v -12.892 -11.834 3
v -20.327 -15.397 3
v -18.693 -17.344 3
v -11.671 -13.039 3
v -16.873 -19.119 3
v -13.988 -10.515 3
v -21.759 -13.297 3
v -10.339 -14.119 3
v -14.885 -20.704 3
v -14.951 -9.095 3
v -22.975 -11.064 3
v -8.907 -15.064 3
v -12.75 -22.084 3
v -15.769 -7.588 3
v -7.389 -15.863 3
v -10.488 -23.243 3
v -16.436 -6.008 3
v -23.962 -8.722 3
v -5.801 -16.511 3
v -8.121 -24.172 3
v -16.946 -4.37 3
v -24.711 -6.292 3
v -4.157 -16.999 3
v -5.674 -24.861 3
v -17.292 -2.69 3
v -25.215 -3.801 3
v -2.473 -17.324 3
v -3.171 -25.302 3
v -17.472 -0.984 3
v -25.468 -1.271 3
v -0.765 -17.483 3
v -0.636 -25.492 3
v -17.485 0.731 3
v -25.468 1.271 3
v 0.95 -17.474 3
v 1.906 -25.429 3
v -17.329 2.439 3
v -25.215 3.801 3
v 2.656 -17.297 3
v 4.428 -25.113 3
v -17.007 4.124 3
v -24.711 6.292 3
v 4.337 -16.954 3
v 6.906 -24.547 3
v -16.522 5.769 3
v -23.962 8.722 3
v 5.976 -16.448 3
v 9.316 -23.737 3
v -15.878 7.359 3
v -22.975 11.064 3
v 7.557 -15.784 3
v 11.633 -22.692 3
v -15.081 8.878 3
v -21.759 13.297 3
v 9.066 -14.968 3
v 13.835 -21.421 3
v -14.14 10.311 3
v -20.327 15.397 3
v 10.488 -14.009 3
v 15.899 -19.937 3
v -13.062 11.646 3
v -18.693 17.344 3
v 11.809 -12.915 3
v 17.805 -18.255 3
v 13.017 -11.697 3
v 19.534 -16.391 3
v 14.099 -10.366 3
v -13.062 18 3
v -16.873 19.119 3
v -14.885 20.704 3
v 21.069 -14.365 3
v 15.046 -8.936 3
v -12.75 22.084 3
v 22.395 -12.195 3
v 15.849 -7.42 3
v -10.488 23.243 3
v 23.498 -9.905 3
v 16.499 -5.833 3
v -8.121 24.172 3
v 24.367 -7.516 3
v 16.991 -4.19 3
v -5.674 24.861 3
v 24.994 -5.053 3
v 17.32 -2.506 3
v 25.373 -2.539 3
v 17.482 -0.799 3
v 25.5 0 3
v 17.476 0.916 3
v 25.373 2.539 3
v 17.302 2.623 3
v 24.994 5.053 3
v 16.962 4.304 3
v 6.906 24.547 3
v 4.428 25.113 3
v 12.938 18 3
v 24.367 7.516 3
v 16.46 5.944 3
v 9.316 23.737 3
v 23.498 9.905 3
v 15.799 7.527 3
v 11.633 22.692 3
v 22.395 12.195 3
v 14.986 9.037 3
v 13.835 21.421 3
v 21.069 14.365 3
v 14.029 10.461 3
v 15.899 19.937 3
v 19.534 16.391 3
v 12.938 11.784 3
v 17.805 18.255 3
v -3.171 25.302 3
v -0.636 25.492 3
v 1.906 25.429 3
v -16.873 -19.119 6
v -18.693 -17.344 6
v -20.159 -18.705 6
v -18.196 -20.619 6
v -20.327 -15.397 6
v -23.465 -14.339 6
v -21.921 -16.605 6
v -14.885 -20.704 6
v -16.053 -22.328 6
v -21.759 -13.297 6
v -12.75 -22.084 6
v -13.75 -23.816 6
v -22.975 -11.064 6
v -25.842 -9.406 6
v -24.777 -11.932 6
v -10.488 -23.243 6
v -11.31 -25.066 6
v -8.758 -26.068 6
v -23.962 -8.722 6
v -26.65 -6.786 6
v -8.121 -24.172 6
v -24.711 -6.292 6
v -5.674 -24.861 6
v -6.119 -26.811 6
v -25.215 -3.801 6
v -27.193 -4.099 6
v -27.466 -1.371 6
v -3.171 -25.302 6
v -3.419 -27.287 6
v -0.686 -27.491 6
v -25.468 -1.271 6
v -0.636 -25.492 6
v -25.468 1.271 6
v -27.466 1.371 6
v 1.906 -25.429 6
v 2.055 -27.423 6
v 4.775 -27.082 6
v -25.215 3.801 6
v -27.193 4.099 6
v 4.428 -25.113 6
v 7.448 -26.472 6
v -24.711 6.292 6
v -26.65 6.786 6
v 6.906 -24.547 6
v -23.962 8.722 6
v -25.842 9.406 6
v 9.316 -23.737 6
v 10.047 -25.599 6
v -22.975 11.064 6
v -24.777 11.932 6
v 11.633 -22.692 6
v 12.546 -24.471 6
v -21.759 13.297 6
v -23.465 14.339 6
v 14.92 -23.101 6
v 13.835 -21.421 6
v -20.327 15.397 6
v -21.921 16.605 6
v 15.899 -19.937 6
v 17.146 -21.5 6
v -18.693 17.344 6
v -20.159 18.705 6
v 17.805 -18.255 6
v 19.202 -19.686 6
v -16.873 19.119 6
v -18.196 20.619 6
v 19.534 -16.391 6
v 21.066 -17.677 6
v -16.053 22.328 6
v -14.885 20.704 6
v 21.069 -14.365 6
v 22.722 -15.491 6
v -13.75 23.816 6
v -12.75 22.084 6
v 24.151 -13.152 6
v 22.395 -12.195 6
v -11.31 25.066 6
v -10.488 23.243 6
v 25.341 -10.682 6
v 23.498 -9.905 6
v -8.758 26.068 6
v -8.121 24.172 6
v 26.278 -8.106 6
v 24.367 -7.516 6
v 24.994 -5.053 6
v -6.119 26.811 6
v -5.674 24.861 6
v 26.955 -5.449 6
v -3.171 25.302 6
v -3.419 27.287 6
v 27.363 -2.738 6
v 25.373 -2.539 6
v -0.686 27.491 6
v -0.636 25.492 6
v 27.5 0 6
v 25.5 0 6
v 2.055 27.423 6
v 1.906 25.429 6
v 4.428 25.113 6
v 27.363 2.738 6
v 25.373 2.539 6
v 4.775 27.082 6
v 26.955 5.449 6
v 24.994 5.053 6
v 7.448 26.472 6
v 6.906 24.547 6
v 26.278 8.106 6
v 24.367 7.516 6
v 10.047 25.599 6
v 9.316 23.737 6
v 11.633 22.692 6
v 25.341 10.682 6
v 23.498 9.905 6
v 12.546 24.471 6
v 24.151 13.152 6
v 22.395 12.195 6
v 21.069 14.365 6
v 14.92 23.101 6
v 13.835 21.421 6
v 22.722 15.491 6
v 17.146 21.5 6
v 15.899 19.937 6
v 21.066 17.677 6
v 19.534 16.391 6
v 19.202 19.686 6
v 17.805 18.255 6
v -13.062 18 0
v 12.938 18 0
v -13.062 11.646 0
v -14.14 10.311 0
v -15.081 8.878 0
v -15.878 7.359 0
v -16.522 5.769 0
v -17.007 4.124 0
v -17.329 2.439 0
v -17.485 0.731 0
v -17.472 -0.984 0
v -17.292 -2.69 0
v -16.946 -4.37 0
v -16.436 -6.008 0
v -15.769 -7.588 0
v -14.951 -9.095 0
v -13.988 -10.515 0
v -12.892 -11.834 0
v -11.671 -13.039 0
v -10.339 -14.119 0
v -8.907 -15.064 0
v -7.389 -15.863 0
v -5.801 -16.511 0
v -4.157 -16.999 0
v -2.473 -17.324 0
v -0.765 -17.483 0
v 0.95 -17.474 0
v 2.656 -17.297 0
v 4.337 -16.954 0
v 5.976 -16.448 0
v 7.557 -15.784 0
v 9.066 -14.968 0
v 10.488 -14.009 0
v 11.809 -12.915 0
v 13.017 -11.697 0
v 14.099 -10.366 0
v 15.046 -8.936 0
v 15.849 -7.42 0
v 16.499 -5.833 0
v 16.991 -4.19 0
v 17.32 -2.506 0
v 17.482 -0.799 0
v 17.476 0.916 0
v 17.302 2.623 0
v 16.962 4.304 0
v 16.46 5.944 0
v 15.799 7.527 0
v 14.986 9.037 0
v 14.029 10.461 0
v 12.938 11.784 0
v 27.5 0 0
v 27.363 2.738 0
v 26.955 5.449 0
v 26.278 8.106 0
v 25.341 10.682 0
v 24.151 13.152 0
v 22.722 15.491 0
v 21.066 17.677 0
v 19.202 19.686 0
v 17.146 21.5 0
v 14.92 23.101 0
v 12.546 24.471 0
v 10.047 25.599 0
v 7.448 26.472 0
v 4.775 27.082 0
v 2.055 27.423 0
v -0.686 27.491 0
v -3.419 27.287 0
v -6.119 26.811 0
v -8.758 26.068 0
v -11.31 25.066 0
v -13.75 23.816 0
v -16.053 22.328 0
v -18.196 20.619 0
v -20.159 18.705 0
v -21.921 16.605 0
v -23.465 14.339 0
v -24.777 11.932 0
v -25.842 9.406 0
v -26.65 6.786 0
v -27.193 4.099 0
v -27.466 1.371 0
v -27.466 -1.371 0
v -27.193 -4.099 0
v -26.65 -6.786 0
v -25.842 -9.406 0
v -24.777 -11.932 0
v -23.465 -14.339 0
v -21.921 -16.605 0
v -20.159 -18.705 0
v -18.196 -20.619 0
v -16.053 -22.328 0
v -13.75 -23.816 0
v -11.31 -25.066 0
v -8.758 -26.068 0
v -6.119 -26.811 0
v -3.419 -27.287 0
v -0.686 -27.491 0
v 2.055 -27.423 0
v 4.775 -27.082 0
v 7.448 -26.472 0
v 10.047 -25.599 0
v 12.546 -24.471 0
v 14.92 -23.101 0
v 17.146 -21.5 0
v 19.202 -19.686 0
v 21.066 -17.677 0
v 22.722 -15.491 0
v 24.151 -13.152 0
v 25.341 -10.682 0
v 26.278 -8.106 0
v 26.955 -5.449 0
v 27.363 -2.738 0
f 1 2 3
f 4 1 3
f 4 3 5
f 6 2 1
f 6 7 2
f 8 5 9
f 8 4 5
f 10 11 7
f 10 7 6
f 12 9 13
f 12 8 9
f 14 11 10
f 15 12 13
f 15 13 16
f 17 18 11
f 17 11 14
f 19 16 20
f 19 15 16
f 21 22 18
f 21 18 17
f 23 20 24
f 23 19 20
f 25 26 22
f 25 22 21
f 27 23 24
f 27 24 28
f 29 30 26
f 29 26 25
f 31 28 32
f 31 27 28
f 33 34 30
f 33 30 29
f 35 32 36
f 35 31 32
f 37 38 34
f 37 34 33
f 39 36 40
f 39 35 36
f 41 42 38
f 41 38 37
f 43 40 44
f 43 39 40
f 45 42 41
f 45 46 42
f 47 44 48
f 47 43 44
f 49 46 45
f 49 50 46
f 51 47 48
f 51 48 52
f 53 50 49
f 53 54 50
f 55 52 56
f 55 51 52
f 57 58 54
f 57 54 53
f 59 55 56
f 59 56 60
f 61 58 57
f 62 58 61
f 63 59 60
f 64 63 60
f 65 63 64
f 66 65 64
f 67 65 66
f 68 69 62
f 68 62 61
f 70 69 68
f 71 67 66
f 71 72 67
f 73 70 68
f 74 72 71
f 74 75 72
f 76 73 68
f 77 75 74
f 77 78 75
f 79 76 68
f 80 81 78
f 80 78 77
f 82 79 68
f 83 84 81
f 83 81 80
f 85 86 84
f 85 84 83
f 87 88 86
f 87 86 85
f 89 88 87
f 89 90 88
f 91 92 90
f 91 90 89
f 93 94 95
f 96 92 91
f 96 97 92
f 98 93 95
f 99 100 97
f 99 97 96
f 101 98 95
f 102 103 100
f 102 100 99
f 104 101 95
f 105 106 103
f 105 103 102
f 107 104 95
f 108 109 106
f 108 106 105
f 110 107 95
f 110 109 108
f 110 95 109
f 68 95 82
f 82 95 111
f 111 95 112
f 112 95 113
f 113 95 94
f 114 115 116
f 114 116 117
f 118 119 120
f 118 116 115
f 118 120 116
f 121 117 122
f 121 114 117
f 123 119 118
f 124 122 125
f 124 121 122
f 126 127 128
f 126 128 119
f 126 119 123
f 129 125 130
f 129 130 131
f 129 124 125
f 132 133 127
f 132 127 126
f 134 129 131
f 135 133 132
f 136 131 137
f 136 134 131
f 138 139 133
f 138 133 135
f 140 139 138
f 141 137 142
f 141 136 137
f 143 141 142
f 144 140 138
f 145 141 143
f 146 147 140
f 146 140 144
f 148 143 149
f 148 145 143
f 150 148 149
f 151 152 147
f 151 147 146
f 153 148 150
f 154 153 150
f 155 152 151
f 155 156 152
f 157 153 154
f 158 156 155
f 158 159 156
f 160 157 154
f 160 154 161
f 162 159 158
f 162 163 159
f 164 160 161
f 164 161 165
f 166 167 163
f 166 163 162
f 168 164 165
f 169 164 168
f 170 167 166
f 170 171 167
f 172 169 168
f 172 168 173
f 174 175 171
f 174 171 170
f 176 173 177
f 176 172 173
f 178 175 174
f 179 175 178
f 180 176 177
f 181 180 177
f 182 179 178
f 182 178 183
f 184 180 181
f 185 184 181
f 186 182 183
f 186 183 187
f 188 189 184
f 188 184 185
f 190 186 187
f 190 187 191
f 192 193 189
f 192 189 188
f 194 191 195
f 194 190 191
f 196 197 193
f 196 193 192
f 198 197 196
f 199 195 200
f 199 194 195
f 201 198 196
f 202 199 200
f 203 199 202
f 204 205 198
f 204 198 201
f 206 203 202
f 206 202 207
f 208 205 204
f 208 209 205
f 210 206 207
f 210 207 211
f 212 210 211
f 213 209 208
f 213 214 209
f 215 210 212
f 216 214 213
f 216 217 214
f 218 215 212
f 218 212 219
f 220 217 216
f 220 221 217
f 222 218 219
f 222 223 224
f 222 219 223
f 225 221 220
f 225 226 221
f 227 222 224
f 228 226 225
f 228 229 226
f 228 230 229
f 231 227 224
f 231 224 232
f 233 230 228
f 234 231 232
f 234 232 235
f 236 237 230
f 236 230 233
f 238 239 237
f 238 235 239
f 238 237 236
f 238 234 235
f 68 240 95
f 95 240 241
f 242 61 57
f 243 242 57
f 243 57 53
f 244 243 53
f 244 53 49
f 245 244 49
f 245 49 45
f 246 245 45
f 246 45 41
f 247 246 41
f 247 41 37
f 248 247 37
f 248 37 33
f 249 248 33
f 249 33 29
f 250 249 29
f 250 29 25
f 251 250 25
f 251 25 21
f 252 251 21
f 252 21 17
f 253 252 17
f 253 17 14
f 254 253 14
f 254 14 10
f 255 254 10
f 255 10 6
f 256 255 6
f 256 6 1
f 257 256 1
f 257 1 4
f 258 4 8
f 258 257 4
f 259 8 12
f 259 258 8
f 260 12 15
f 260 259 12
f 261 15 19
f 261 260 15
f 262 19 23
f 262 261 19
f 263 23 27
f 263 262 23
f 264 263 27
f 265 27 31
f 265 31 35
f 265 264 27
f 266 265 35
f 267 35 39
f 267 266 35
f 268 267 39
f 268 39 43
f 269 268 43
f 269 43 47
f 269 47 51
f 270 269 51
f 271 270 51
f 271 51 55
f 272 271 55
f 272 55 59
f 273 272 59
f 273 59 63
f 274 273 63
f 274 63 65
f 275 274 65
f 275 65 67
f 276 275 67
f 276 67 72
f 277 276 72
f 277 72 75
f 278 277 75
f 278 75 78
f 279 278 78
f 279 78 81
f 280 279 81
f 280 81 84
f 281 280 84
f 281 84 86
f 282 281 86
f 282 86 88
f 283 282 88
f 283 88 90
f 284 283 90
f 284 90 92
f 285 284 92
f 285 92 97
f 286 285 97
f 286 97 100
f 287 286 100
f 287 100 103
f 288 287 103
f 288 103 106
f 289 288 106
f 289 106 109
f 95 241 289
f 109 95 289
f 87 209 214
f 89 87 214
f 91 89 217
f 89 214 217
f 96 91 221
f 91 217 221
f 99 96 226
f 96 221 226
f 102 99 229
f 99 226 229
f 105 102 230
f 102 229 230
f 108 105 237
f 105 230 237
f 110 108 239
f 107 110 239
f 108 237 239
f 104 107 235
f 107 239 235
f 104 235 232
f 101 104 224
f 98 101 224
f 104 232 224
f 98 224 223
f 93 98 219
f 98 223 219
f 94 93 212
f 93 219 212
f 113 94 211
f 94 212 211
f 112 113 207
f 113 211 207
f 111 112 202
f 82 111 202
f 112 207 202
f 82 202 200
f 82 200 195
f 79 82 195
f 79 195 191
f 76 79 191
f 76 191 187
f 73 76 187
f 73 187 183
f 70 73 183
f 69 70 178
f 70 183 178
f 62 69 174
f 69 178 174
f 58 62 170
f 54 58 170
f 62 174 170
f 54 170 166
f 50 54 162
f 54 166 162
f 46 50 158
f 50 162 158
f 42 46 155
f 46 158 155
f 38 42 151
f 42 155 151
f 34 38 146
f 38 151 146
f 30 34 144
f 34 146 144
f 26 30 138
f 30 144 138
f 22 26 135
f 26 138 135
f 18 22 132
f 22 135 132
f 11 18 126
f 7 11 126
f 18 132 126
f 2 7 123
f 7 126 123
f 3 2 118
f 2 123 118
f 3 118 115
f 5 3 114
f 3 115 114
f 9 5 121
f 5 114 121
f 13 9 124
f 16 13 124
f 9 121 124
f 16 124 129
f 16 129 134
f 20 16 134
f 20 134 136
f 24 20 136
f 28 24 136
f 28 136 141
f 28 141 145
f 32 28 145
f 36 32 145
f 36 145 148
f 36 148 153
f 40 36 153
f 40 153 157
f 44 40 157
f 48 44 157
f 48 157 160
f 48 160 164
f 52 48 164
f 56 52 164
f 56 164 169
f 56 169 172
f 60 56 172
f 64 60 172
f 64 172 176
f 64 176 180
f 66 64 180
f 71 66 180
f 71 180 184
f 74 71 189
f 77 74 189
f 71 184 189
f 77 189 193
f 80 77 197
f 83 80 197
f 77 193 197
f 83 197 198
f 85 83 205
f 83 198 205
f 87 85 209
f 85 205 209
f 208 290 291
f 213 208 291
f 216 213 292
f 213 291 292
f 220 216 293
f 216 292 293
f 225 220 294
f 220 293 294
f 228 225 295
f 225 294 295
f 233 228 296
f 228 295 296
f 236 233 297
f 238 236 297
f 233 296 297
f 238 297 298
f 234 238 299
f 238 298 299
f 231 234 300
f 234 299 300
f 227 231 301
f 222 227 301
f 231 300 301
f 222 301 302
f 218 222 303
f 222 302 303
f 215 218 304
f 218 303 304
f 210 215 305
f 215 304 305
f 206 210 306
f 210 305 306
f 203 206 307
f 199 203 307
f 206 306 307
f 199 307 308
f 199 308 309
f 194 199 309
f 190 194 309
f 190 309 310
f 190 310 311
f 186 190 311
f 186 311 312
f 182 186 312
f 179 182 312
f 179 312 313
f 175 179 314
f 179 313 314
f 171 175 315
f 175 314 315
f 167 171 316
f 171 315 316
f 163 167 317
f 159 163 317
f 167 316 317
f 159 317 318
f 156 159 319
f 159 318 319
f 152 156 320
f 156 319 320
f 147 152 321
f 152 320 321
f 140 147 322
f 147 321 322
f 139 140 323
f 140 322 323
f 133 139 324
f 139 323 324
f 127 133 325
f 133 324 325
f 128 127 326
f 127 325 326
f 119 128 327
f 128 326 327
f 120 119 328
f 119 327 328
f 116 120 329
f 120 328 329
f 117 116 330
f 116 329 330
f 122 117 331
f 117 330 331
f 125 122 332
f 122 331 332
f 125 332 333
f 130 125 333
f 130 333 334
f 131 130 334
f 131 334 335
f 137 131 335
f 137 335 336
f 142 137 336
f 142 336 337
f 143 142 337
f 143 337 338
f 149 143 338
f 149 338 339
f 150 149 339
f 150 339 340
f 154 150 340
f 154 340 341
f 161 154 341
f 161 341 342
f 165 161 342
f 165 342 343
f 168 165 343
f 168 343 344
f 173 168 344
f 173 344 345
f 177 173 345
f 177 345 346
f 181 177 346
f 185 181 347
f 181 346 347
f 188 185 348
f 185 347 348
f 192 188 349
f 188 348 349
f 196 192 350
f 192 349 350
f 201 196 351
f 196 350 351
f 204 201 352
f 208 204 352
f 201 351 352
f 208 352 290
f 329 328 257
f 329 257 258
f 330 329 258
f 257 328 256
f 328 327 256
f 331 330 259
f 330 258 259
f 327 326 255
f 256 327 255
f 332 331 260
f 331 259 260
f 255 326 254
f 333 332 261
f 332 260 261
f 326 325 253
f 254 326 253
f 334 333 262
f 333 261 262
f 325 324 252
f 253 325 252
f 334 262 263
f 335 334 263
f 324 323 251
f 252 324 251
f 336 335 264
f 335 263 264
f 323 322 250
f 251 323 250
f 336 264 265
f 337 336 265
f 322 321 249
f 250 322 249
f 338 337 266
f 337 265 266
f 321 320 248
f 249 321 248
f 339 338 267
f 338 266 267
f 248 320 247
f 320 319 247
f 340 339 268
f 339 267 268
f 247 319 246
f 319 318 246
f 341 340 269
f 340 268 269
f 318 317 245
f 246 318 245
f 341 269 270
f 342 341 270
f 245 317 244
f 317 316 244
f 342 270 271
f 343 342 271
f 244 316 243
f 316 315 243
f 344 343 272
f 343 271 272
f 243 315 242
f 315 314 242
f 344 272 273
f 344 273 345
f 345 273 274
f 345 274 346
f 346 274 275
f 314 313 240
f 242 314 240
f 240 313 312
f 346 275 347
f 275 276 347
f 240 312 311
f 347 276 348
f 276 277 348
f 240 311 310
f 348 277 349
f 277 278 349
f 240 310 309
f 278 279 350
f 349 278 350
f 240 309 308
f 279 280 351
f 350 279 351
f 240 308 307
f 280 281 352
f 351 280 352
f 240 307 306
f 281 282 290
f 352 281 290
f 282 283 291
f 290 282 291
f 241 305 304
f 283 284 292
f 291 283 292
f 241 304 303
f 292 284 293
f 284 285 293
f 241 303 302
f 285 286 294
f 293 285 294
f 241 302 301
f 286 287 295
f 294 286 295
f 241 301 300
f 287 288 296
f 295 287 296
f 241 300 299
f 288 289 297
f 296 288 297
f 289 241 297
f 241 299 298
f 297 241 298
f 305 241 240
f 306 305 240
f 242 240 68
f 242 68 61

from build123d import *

# Parameters (mm, degrees)
F0_R     = 27.5
F0_R_2   = 17.5
F1_DEPTH = 6
F2_R     = 25.5
F2_R_2   = 17.5
F3_DEPTH = 3
F4_W     = 26
F4_H     = 24
F5_DEPTH = 25


with BuildPart() as f1:
    # F0 (on Top) → F1 (new body)
    with BuildSketch(Plane.XY):
        Circle(F0_R)
        Circle(F0_R_2, mode=Mode.SUBTRACT)
    extrude(amount=F1_DEPTH)

    # F2 (on face) → F3 (cut)
    with BuildSketch(Plane.XY.offset(6)):
        Circle(F2_R)
        Circle(F2_R)
        Circle(F2_R_2, mode=Mode.SUBTRACT)
    extrude(amount=-F3_DEPTH, mode=Mode.SUBTRACT)

    # F4 (on face) → F5 (cut)
    with BuildSketch(Plane(origin=(0, 0, 0), x_dir=(1, 0, 0), z_dir=(0, 0, -1))):
        with Locations((-0.062166, -6)):
            Rectangle(F4_W, F4_H)
    extrude(amount=-F5_DEPTH, mode=Mode.SUBTRACT)


solid = f1.part
